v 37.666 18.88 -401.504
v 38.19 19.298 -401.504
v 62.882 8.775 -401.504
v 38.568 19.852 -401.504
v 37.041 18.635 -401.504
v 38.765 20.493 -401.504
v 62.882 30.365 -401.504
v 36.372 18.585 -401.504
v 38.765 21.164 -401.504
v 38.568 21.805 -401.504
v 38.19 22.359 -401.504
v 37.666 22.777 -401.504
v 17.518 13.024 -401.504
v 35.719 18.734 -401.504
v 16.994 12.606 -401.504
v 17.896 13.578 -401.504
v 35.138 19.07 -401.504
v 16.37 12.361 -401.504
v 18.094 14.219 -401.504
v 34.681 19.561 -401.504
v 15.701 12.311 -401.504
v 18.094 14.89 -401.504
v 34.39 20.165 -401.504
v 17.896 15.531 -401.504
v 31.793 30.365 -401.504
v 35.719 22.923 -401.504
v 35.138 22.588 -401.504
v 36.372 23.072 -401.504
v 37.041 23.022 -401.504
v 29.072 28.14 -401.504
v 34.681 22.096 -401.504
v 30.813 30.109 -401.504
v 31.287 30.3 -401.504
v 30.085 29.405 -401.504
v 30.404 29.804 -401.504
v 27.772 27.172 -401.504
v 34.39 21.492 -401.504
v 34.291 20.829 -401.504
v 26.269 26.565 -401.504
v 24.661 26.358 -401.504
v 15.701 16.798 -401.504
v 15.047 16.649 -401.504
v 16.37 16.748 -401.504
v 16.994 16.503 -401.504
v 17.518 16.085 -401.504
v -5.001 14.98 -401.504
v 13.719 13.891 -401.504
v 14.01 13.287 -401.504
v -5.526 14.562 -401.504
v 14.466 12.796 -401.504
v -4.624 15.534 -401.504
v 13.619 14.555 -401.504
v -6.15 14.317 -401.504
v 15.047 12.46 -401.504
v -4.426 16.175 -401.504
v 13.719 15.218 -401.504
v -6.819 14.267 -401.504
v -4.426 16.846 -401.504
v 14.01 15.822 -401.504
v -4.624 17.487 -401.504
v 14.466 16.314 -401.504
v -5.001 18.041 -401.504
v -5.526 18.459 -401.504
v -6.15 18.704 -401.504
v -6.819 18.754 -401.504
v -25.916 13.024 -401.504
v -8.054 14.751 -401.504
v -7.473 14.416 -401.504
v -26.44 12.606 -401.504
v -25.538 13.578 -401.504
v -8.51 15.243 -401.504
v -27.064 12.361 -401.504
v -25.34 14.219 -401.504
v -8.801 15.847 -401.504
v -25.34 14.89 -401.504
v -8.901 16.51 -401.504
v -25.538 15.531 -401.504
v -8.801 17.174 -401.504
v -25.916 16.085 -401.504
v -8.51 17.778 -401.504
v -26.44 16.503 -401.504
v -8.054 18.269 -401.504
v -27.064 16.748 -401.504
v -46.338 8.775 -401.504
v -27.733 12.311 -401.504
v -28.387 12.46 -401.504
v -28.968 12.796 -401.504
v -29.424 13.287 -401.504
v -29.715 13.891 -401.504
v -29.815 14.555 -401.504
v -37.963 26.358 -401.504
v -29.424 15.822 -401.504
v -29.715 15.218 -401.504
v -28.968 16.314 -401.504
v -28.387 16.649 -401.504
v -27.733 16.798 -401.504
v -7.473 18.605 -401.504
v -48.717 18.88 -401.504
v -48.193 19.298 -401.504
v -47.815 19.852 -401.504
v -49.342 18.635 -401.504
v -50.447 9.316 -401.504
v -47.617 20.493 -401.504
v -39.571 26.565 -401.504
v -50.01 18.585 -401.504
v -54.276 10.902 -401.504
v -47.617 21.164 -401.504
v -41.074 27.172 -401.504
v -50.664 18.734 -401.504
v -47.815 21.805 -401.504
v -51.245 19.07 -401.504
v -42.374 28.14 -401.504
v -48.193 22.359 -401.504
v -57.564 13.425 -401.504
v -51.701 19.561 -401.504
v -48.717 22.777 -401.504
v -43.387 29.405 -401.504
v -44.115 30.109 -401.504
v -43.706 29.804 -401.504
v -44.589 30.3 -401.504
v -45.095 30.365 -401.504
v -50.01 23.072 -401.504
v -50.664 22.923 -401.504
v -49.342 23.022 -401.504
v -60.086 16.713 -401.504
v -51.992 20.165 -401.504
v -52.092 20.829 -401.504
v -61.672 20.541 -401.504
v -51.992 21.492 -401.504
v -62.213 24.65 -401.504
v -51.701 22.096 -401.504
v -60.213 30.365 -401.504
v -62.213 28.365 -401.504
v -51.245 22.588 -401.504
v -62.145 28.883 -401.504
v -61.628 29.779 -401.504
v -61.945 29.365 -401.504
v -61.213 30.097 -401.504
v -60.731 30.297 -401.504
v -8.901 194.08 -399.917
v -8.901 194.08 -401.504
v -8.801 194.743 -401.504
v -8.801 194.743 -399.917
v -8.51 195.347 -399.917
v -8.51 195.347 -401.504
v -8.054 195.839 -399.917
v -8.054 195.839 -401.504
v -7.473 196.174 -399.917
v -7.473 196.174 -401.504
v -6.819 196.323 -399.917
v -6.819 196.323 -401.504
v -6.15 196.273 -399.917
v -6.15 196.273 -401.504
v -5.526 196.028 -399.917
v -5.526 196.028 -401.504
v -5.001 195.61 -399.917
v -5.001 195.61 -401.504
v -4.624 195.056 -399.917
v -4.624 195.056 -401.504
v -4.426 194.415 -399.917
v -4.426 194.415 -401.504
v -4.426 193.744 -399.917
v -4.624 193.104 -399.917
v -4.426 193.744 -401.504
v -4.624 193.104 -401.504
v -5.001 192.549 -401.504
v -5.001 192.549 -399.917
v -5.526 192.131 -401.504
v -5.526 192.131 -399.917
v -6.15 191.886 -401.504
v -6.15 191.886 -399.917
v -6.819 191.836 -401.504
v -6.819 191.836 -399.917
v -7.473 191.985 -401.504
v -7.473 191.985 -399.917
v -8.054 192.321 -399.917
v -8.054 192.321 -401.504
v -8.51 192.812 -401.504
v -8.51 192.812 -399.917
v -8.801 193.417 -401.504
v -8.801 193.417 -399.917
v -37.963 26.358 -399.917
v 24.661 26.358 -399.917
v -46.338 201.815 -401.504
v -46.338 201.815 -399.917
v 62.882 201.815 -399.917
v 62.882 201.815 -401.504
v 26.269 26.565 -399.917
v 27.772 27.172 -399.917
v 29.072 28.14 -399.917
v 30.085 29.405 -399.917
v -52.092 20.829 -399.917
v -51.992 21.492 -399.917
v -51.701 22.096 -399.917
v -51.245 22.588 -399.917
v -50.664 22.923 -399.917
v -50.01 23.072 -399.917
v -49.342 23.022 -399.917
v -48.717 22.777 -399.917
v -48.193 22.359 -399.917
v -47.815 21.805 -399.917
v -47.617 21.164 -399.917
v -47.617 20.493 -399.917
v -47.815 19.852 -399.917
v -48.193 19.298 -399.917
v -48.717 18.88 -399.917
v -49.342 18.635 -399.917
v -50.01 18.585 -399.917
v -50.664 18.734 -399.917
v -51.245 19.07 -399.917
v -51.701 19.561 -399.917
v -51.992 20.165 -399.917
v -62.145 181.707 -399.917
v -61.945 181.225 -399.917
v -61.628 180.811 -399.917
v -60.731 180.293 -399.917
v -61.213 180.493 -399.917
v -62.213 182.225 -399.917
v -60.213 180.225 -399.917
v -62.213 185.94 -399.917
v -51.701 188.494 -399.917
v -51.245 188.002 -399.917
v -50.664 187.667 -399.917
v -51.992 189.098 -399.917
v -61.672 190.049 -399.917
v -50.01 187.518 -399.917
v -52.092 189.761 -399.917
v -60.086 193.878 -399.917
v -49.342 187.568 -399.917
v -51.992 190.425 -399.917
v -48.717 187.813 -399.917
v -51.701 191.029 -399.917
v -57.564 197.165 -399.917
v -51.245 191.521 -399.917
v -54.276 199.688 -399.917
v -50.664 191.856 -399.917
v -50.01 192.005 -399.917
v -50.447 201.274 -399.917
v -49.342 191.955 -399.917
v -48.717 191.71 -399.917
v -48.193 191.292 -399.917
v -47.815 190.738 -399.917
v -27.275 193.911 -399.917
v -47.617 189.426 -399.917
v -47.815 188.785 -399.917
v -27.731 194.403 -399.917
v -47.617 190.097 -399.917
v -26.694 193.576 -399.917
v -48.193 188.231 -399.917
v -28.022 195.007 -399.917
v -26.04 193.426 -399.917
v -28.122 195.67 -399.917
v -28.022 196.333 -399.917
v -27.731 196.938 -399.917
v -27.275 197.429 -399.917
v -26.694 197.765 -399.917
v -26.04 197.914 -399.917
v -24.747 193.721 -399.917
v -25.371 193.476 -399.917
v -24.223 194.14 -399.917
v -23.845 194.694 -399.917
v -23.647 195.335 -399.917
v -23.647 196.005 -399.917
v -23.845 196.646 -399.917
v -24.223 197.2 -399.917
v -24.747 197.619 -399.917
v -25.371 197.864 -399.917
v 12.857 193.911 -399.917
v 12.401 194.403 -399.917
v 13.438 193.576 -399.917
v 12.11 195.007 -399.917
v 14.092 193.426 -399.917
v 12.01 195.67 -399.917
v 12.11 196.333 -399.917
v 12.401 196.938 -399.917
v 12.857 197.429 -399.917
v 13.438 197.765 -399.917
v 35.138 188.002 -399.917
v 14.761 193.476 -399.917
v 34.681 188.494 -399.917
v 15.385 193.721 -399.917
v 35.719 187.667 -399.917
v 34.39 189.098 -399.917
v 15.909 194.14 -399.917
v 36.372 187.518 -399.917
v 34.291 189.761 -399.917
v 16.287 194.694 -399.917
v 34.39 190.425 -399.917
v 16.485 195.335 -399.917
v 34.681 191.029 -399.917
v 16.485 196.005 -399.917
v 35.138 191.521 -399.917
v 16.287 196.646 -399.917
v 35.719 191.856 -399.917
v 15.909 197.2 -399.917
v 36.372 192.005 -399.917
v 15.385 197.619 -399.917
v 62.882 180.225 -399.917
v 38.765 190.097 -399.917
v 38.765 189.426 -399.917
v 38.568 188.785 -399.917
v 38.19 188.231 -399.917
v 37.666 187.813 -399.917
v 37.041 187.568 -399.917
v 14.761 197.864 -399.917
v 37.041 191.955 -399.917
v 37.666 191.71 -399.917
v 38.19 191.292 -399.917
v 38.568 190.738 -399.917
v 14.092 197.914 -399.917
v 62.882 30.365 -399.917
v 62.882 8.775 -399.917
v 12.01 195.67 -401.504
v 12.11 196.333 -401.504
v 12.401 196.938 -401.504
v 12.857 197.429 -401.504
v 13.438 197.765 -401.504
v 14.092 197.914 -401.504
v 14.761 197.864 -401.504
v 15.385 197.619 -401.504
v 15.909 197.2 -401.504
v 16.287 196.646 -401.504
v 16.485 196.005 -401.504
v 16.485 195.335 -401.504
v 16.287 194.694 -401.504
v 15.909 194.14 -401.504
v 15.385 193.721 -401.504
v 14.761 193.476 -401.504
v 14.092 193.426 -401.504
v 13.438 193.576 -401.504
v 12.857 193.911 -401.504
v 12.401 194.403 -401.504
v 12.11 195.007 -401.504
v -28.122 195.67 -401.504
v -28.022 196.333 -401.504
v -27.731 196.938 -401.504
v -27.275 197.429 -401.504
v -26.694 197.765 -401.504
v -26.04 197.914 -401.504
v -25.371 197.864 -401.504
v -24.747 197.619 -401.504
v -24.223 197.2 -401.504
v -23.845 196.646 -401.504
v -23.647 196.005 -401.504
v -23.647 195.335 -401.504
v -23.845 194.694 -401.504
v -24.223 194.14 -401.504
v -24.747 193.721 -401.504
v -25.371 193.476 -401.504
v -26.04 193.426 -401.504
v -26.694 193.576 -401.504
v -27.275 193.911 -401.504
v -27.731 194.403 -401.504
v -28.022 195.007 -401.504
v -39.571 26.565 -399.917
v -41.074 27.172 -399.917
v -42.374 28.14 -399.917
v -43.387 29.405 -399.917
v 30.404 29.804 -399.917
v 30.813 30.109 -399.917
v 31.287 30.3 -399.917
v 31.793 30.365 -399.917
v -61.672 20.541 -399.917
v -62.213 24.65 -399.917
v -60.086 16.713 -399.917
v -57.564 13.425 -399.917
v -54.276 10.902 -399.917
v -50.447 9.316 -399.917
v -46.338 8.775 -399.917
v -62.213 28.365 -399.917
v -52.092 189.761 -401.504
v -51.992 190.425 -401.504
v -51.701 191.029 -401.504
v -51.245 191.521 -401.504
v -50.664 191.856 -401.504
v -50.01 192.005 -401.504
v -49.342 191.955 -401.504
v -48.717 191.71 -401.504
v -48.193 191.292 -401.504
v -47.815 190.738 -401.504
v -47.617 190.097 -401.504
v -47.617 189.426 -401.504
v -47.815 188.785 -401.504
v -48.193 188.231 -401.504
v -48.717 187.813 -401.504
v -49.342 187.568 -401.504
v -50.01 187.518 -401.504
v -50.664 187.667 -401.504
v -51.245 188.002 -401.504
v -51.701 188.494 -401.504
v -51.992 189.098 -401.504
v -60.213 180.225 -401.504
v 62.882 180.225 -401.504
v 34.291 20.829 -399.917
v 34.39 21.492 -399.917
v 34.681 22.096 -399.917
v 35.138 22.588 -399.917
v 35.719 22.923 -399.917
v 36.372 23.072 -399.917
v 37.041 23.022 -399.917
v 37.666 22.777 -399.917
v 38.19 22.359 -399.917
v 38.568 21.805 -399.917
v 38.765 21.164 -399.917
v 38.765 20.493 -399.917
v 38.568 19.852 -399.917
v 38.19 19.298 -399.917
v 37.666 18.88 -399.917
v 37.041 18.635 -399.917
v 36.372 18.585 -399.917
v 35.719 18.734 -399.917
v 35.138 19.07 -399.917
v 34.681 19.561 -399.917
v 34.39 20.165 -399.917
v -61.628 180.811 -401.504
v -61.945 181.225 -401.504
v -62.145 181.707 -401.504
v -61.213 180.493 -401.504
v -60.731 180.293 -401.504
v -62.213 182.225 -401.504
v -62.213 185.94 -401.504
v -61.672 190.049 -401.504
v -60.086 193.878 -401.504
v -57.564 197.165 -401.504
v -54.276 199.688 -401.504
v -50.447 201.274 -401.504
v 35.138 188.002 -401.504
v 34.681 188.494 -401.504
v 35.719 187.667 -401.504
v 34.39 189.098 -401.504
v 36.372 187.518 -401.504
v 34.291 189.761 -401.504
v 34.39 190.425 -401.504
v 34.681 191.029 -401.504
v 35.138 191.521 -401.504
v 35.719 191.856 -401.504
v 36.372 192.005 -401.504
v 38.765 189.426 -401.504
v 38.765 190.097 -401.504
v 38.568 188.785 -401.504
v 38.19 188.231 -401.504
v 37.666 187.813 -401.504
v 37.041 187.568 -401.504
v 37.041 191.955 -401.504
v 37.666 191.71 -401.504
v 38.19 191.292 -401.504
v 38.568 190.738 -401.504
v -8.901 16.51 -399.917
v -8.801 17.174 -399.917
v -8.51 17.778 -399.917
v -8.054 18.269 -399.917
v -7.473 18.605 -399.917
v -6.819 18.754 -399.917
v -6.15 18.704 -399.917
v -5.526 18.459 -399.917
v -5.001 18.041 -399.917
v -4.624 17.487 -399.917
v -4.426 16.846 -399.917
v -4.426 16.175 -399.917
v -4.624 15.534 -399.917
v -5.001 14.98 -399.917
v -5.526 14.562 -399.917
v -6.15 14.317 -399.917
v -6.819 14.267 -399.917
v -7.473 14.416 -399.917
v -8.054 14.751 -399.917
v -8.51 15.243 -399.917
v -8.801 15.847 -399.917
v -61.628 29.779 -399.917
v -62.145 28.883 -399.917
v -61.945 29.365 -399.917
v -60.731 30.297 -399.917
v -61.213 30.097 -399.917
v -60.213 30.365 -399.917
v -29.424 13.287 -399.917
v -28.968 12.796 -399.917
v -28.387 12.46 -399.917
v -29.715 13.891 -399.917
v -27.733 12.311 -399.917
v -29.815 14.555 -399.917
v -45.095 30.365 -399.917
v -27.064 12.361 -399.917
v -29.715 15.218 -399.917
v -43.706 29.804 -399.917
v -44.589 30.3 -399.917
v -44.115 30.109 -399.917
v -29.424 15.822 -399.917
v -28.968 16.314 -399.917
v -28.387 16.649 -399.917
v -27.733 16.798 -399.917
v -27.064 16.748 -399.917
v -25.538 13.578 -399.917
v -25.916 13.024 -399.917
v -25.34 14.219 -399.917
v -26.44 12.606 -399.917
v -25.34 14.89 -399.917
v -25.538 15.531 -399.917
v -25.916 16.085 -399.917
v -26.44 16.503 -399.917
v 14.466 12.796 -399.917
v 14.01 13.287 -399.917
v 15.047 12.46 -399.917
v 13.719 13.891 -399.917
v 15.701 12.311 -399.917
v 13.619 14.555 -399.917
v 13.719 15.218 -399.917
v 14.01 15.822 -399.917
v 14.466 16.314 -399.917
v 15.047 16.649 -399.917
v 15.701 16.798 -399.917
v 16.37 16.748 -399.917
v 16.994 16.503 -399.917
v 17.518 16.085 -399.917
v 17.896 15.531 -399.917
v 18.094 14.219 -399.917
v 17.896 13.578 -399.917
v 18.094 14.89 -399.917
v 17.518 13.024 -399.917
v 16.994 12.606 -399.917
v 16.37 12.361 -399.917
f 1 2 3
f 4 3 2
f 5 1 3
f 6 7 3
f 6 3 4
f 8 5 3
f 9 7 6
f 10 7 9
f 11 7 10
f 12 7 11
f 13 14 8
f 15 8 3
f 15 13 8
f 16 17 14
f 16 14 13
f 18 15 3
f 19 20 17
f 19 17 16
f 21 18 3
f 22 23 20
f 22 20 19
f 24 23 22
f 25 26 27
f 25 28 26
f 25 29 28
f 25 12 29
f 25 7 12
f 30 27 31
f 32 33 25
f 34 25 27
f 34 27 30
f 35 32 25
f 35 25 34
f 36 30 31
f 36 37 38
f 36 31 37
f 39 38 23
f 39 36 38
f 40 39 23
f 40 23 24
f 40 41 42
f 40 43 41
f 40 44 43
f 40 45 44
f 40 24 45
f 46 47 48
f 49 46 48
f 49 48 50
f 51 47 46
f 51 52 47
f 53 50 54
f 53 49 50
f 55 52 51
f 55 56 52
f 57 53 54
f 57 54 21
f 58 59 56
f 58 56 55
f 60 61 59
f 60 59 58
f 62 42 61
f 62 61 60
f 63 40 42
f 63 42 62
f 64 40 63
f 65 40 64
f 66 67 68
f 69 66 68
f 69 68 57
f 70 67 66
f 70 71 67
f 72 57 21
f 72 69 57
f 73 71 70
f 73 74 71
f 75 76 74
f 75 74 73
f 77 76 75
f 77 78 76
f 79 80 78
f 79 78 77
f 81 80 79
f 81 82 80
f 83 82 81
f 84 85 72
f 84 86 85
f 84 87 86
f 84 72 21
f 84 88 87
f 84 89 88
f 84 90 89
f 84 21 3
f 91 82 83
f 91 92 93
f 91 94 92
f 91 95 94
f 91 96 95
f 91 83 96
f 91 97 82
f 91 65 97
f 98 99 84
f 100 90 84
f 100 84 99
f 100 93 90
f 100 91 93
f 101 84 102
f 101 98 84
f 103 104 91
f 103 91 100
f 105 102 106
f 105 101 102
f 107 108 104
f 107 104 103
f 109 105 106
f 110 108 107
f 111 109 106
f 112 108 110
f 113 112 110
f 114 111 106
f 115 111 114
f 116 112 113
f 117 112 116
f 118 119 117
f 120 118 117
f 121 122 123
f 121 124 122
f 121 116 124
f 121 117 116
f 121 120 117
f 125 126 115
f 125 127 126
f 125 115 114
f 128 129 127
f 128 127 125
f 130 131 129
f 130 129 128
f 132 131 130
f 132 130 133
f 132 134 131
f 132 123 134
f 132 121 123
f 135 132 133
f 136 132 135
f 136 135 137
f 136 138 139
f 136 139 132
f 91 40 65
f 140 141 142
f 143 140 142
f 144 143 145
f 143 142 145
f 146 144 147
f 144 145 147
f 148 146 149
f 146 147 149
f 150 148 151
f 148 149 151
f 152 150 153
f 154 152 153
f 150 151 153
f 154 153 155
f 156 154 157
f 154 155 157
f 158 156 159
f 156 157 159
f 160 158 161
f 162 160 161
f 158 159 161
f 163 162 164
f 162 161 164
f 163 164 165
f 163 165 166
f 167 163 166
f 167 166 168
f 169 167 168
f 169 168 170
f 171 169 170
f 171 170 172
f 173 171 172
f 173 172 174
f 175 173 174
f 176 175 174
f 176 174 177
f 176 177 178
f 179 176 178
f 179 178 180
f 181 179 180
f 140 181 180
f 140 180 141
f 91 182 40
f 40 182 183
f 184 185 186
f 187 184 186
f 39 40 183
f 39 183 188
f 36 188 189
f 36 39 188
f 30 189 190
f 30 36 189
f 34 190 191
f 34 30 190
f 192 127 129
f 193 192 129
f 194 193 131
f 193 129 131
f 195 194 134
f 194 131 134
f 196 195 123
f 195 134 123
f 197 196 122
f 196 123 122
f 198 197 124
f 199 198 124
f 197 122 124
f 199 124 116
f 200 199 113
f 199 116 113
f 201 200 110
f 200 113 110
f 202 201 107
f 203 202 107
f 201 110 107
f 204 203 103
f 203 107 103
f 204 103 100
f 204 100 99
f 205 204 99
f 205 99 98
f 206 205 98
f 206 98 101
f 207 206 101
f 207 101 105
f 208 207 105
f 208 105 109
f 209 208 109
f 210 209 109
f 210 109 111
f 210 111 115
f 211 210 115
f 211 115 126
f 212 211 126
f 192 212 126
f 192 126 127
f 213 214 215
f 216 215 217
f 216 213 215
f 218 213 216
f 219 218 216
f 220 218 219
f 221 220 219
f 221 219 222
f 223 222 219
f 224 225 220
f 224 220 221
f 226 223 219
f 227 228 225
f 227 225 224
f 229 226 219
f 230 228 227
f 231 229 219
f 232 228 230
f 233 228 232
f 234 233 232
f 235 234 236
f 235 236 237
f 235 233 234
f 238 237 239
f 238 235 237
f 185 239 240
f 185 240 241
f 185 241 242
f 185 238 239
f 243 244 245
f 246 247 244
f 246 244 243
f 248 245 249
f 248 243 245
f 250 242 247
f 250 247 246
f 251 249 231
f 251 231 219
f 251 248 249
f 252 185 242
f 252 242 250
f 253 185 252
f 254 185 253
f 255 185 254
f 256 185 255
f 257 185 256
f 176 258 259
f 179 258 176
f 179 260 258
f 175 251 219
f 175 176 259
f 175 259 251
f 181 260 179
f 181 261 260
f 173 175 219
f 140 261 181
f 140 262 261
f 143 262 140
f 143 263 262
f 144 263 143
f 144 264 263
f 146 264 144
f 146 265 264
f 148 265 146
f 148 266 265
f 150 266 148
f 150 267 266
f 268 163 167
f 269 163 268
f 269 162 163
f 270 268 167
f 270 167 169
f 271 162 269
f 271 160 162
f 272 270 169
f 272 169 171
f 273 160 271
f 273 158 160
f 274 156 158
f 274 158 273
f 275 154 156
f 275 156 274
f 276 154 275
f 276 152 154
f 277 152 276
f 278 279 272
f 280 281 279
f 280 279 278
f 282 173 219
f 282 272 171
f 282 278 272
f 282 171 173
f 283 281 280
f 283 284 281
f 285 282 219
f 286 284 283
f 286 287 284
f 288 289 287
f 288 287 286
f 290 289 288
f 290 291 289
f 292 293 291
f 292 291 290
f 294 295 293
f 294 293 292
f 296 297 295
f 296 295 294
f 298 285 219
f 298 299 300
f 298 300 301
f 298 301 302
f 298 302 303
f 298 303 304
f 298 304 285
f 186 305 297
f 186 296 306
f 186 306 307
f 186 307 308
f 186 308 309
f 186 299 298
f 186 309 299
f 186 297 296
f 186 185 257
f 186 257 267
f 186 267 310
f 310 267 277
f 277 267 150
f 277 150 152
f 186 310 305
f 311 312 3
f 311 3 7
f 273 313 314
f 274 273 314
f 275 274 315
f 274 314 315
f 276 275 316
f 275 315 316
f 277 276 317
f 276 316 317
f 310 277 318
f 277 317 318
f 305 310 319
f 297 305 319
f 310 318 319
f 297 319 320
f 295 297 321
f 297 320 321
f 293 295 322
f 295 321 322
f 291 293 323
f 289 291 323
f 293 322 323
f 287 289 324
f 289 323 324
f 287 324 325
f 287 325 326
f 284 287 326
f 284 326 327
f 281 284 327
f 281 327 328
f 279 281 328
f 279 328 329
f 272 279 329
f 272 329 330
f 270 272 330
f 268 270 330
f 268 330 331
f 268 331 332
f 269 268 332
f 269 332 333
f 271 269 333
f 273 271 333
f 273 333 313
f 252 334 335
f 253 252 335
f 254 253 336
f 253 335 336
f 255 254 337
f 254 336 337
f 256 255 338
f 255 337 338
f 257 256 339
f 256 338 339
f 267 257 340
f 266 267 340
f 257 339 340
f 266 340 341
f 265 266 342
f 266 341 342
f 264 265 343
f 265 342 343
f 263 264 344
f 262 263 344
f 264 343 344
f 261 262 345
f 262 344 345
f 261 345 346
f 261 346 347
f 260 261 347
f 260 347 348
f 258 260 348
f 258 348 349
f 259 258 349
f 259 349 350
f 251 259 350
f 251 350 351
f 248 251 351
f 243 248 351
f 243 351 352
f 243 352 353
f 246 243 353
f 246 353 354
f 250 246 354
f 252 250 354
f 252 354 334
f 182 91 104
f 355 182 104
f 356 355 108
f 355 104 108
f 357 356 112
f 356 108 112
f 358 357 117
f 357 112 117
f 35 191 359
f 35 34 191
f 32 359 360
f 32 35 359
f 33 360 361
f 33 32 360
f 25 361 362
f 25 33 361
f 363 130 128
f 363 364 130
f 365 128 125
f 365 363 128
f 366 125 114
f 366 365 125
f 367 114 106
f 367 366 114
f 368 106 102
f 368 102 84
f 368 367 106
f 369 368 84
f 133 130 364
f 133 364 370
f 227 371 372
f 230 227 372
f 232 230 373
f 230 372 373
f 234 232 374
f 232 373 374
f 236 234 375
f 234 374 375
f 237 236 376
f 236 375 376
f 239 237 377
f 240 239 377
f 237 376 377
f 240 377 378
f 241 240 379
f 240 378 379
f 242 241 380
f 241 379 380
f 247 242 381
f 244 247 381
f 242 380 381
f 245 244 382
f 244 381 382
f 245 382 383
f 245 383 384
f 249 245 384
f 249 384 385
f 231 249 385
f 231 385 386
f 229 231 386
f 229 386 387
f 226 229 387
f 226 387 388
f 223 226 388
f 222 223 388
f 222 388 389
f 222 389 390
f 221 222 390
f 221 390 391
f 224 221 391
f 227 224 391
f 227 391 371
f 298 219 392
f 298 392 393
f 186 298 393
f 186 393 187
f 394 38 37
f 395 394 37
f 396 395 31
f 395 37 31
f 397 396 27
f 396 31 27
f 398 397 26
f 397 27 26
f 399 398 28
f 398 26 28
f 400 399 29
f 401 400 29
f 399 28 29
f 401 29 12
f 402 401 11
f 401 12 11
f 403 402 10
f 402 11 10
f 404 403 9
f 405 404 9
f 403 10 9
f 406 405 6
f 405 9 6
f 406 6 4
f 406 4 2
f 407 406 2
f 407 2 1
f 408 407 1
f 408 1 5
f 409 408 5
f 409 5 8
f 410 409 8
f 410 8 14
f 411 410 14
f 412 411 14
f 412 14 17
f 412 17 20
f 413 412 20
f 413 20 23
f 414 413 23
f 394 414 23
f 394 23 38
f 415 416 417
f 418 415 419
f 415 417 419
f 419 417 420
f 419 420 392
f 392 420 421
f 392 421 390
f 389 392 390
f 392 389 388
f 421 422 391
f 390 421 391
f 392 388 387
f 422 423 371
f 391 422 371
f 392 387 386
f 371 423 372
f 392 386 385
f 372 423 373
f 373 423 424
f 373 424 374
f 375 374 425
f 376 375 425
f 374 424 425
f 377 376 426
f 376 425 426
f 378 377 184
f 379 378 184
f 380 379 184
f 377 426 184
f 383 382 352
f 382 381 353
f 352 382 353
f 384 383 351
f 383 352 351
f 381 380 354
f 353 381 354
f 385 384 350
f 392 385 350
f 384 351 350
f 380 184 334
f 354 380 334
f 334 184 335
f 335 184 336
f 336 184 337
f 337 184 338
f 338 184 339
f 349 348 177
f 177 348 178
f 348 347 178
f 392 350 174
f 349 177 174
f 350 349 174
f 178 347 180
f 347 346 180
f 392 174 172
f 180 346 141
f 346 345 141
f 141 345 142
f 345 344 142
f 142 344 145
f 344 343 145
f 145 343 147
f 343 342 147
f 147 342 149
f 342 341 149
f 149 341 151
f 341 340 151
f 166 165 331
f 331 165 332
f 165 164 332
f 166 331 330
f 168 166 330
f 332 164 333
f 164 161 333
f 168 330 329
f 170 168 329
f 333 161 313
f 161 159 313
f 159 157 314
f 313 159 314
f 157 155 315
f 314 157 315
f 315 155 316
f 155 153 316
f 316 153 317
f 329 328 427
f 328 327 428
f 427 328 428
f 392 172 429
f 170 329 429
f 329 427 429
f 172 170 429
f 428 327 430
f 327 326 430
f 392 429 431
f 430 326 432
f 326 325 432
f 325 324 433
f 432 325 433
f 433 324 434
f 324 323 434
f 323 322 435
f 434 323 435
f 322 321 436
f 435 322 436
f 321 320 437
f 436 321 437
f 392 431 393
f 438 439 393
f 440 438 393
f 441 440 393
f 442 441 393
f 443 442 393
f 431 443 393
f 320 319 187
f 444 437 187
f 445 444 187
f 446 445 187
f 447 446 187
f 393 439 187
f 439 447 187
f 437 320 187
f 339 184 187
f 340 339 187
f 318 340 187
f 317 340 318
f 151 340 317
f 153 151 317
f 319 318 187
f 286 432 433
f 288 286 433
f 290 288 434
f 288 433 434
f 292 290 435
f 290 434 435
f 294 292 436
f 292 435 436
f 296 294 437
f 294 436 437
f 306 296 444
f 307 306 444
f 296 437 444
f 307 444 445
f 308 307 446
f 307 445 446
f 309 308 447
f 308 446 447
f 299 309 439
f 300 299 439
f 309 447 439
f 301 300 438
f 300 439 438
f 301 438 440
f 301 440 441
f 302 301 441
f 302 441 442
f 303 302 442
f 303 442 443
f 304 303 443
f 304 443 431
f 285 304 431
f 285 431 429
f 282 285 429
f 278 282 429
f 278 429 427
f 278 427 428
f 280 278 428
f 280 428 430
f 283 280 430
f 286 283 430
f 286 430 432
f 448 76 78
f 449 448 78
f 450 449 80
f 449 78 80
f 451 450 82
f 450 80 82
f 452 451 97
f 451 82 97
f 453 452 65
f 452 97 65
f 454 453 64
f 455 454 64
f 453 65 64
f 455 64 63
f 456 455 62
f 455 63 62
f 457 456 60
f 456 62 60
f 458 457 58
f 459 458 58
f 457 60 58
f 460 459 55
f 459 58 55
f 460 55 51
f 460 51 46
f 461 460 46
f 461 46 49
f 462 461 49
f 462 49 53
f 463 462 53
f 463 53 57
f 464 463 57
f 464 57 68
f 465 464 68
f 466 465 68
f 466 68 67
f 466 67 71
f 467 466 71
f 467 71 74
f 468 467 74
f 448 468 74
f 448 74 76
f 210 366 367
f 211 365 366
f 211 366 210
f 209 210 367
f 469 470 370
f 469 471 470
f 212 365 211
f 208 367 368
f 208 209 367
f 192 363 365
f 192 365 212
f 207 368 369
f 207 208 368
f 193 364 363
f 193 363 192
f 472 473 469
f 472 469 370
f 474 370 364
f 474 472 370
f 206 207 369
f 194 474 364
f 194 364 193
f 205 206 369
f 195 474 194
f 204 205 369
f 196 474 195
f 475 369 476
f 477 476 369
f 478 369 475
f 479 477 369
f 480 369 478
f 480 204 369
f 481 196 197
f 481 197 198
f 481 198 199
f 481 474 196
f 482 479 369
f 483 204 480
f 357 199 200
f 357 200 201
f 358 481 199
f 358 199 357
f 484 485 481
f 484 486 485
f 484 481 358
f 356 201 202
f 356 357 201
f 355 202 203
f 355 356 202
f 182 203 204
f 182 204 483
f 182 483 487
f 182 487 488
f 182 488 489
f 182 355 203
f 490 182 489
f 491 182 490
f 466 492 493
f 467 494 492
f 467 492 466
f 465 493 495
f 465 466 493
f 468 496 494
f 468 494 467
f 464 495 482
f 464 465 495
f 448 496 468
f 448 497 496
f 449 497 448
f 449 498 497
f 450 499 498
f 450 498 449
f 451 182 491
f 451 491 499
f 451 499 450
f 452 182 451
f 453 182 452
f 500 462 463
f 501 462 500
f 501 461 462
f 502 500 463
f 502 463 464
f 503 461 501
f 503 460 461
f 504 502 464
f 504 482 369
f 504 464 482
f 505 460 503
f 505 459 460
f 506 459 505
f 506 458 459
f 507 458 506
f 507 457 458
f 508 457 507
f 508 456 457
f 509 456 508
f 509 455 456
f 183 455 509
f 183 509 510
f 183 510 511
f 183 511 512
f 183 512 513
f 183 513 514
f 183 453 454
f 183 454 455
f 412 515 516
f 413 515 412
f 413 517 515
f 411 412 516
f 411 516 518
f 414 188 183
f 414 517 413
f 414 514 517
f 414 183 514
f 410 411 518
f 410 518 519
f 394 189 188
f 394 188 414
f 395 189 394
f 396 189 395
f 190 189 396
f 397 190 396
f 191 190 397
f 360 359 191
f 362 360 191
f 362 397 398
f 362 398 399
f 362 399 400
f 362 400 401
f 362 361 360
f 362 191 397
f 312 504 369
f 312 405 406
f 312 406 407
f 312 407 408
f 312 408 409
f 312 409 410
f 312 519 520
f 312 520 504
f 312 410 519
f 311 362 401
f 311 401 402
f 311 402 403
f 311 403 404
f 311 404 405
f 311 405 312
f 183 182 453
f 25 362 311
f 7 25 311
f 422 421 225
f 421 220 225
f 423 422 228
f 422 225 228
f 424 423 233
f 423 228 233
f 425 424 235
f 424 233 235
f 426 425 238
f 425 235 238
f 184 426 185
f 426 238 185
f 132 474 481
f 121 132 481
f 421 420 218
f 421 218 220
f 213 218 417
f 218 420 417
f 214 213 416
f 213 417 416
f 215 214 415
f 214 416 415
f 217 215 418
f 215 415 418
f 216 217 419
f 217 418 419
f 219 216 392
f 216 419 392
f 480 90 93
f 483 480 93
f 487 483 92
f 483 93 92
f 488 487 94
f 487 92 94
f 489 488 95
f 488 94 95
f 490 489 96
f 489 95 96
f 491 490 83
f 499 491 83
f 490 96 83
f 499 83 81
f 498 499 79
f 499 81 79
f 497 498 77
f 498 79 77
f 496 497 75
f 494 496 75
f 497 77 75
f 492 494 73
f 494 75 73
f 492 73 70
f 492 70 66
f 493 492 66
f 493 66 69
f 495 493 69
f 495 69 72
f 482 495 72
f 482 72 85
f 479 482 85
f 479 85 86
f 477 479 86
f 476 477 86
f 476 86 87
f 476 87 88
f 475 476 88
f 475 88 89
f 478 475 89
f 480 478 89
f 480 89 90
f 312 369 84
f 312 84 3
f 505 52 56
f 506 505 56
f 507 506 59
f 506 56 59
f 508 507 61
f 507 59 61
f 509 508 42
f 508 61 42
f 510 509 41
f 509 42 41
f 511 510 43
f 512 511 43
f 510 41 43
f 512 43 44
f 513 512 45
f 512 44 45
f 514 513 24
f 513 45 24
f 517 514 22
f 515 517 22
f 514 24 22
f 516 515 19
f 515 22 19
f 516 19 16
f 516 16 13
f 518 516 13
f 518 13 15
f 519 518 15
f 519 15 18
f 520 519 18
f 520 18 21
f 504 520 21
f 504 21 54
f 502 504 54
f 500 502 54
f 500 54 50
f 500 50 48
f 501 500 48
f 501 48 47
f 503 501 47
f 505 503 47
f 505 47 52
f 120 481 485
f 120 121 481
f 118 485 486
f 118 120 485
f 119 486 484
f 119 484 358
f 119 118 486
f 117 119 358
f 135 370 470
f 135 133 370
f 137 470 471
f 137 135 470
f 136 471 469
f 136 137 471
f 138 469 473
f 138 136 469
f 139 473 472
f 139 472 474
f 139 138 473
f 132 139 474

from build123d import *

# Parameters (mm, degrees)
SKETCH2_W            = 111.125
SKETCH2_H            = 193.04
BOSS_EXTRUDE1_DEPTH  = 1.5875
M4_CLEARANCE_HOLE1_D = 4.5
FILLET1_R            = 15.875
SKETCH6_R            = 2.4003
SKETCH6_R_2          = 3
SKETCH6_R_3          = 6.477
SKETCH6_R_4          = 10.762
CUT_EXTRUDE1_DEPTH   = 212.192646736
SKETCH7_W            = 13.97
SKETCH7_H            = 193.04
BOSS_EXTRUDE2_DEPTH  = 1.5875
SKETCH8_W            = 75.32443897
SKETCH8_H            = 38.1
SKETCH8_R            = 10.762
SKETCH8_R_2          = 3
SKETCH8_H_2          = 31.75
SKETCH8_H_3          = 34.487219484
SKETCH8_R_3          = 2.4003
SKETCH8_R_4          = 6.477
SKETCH8_R_5          = 8.9535
CUT_EXTRUDE2_DEPTH   = 1.5875
FILLET2_R            = 9.525
FILLET3_R            = 6.35
FILLET4_R            = 9.525
SKETCH9_W            = 125.095
SKETCH9_H            = 149.86
CUT_EXTRUDE5_DEPTH   = 80
FILLET6_R            = 2
FILLET8_R            = 2
FILLET9_R            = 2
FILLET10_R           = 2
SKETCH17_R           = 2.25
CUT_EXTRUDE12_DEPTH  = 72.5925
SKETCH18_R           = 2.25
BOSS_EXTRUDE9_DEPTH  = 1.5875
SKETCH20_R           = 2.25
CUT_EXTRUDE18_DEPTH  = 17.5875


with BuildPart() as part:
    # Sketch2 → Boss-Extrude1 (new body)
    with BuildSketch(Plane.XY.offset(-401.504104662)):
        with Locations((-6.650833159, 105.295051609)):
            Rectangle(SKETCH2_W, SKETCH2_H)
    extrude(amount=BOSS_EXTRUDE1_DEPTH)

    # M4 Clearance Hole1 (through all)
    with Locations(Plane.XY.offset(-399.916604662)):
        with Locations((36.540537091, 189.761421859), (-6.650833159, 194.079751609), (-49.842203409, 189.761421859), (-54.160533159, 133.489051609), (-54.160533159, 77.101051609), (-49.842203409, 20.82868136), (-6.650833159, 16.510351609), (36.540537091, 20.82868136), (40.858866841, 77.101051609), (40.858866841, 133.489051609), (14.260079544, 195.670051609), (-55.750833159, 105.295051609), (-27.561745863, 14.920051609)):
            Hole(M4_CLEARANCE_HOLE1_D / 2)

    # Fillet1
    fillet1_edges = [part.edges().sort_by_distance(p)[0] for p in [
        (-62.213333159, 201.815051609, -400.710354662),
        (-62.213333159, 8.775051609, -400.710354662),
    ]]
    fillet(fillet1_edges, radius=FILLET1_R)

    # Sketch6 → Cut-Extrude1 (cut, through all)
    with BuildSketch(Plane.XY.offset(-399.916604662)):
        with Locations((-34.590833159, 43.382551609)):
            Circle(SKETCH6_R)
        with Locations((21.289166841, 43.382551609)):
            Circle(SKETCH6_R)
        with Locations((-20.884724927, 142.590766631)):
            Circle(SKETCH6_R_2)
        with Locations((7.583058609, 166.225175879)):
            Circle(SKETCH6_R_2)
        with Locations((3.509166841, 43.382551609)):
            Circle(SKETCH6_R_3)
        with Locations((-16.810833159, 43.382551609)):
            Circle(SKETCH6_R_3)
        with Locations((-33.320833159, 123.670051609)):
            Circle(SKETCH6_R_3)
        with Locations((-6.650833159, 154.407971255)):
            Circle(SKETCH6_R_4)
        with Locations((-6.650833159, 94.607131964)):
            Circle(SKETCH6_R_4)
    extrude(amount=-CUT_EXTRUDE1_DEPTH, mode=Mode.SUBTRACT)

    # Sketch7 → Boss-Extrude2 (add)
    with BuildSketch(Plane.XY.offset(-399.916604662)):
        with Locations((55.896666841, 105.295051609)):
            Rectangle(SKETCH7_W, SKETCH7_H)
    extrude(amount=-BOSS_EXTRUDE2_DEPTH)

    # Sketch8 → Cut-Extrude2 (cut)
    # profile 1 of 4: a face of its own
    with BuildSketch(Plane.XY.offset(-399.916604662)):
        with Locations((-6.650833159, 154.407971255)):
            Rectangle(SKETCH8_W, SKETCH8_H)
        with Locations((-6.650833159, 154.407971255)):
            Circle(SKETCH8_R, mode=Mode.SUBTRACT)
        with Locations((7.583058609, 166.225175879)):
            Circle(SKETCH8_R_2, mode=Mode.SUBTRACT)
        with Locations((-20.884724927, 142.590766631)):
            Circle(SKETCH8_R_2, mode=Mode.SUBTRACT)
    # profile 2 of 4: a face of its own
    with BuildSketch(Plane.XY.offset(-399.916604662)):
        with Locations((-6.650833159, 94.607131964)):
            Rectangle(SKETCH8_W, SKETCH8_H_2)
        with Locations((-6.650833159, 94.607131964)):
            Circle(SKETCH8_R, mode=Mode.SUBTRACT)
    # profile 3 of 4: a face of its own
    with BuildSketch(Plane.XY.offset(-399.916604662)):
        with Locations((-6.650833159, 43.601441867)):
            Rectangle(SKETCH8_W, SKETCH8_H_3)
        with Locations((-34.590833159, 43.382551609)):
            Circle(SKETCH8_R_3, mode=Mode.SUBTRACT)
        with Locations((-16.810833159, 43.382551609)):
            Circle(SKETCH8_R_4, mode=Mode.SUBTRACT)
        with Locations((3.509166841, 43.382551609)):
            Circle(SKETCH8_R_4, mode=Mode.SUBTRACT)
        with Locations((21.289166841, 43.382551609)):
            Circle(SKETCH8_R_3, mode=Mode.SUBTRACT)
    # profile 4 of 4: a face of its own
    with BuildSketch(Plane.XY.offset(-399.916604662)):
        with Locations((-33.320833159, 123.670051609)):
            Circle(SKETCH8_R_5)
        with Locations((-33.320833159, 123.670051609)):
            Circle(SKETCH8_R_4, mode=Mode.SUBTRACT)
    extrude(amount=-CUT_EXTRUDE2_DEPTH, mode=Mode.SUBTRACT)

    # Fillet2
    fillet2_edges = [part.edges().sort_by_distance(p)[0] for p in [
        (-44.313052644, 173.457971255, -400.710354662),
        (-44.313052644, 135.357971255, -400.710354662),
        (31.011386326, 135.357971255, -400.710354662),
        (31.011386326, 173.457971255, -400.710354662),
    ]]
    fillet(fillet2_edges, radius=FILLET2_R)

    # Fillet3
    fillet3_edges = [part.edges().sort_by_distance(p)[0] for p in [
        (-44.313052644, 26.357832125, -400.710354662),
        (31.011386326, 26.357832125, -400.710354662),
        (31.011386326, 60.845051609, -400.710354662),
        (-44.313052644, 60.845051609, -400.710354662),
    ]]
    fillet(fillet3_edges, radius=FILLET3_R)

    # Fillet4
    fillet4_edges = [part.edges().sort_by_distance(p)[0] for p in [
        (-44.313052644, 110.482131964, -400.710354662),
        (-44.313052644, 78.732131964, -400.710354662),
        (31.011386326, 78.732131964, -400.710354662),
        (31.011386326, 110.482131964, -400.710354662),
    ]]
    fillet(fillet4_edges, radius=FILLET4_R)

    # Sketch9 → Cut-Extrude5 (cut)
    with BuildSketch(Plane.XY.offset(-399.916604662)):
        with Locations((0.334166841, 105.295051609)):
            Rectangle(SKETCH9_W, SKETCH9_H)
    extrude(amount=-CUT_EXTRUDE5_DEPTH, mode=Mode.SUBTRACT)


with BuildPart() as cut_extrude5_piece_1:
    # of the separate pieces the step leaves, piece 1, a body of its own (cut_extrude5_pieces)
    add(part.part.solids().sort_by_distance((-62.213333159, 180.225051609, -401.504104662))[0])

    # Fillet10
    fillet10_edges = [cut_extrude5_piece_1.edges().sort_by_distance(p)[0] for p in [
        (-62.213333159, 180.225051609, -400.710354662),
    ]]
    fillet(fillet10_edges, radius=FILLET10_R)


with BuildPart() as cut_extrude5_piece_2:
    # of the separate pieces the step leaves, piece 2, a body of its own (cut_extrude5_pieces)
    add(part.part.solids().sort_by_distance((62.881666841, 30.365051609, -401.504104662))[0])

    # Fillet6
    fillet6_edges = [cut_extrude5_piece_2.edges().sort_by_distance(p)[0] for p in [
        (-62.213333159, 30.365051609, -400.710354662),
    ]]
    fillet(fillet6_edges, radius=FILLET6_R)

    # Fillet8
    fillet8_edges = [cut_extrude5_piece_2.edges().sort_by_distance(p)[0] for p in [
        (-43.86507598, 30.365051609, -400.710354662),
    ]]
    fillet(fillet8_edges, radius=FILLET8_R)

    # Fillet9
    fillet9_edges = [cut_extrude5_piece_2.edges().sort_by_distance(p)[0] for p in [
        (30.563409662, 30.365051609, -400.710354662),
    ]]
    fillet(fillet9_edges, radius=FILLET9_R)

    # Sketch17 → Cut-Extrude12 (cut)
    with BuildSketch(Plane(origin=(0, 0, -401.504104662), x_dir=(-1, 0, 0), z_dir=(0, 0, -1))):
        with Locations((-15.869025161, 14.55469533)):
            Circle(SKETCH17_R)
    extrude(amount=-CUT_EXTRUDE12_DEPTH, mode=Mode.SUBTRACT)

    # Sketch18 → Boss-Extrude9 (add)
    with BuildSketch(Plane(origin=(0, 0, -401.504104662), x_dir=(-1, 0, 0), z_dir=(0, 0, -1))):
        with Locations((27.561745863, 14.920051609)):
            Circle(SKETCH18_R)
    extrude(amount=-BOSS_EXTRUDE9_DEPTH)


with BuildPart() as cut_extrude18_tool:
    # Sketch20 → Cut-Extrude18 (new body)
    with BuildSketch(Plane(origin=(0, 0, -401.504104662), x_dir=(-1, 0, 0), z_dir=(0, 0, -1))):
        with Locations((27.564974839, 14.55469533)):
            Circle(SKETCH20_R)
        with Locations((25.871920456, 195.670051609)):
            Circle(SKETCH20_R)
    extrude(amount=-CUT_EXTRUDE18_DEPTH)


with BuildPart() as cut_extrude5_piece_1_1:
    add(cut_extrude5_piece_1.part)

    # Cut-Extrude18: cut by cut_extrude18_tool
    add(cut_extrude18_tool.part, mode=Mode.SUBTRACT)


with BuildPart() as cut_extrude5_piece_2_1:
    add(cut_extrude5_piece_2.part)

    # Cut-Extrude18: cut by cut_extrude18_tool
    add(cut_extrude18_tool.part, mode=Mode.SUBTRACT)


solid = Compound([cut_extrude5_piece_1_1.part, cut_extrude5_piece_2_1.part])
